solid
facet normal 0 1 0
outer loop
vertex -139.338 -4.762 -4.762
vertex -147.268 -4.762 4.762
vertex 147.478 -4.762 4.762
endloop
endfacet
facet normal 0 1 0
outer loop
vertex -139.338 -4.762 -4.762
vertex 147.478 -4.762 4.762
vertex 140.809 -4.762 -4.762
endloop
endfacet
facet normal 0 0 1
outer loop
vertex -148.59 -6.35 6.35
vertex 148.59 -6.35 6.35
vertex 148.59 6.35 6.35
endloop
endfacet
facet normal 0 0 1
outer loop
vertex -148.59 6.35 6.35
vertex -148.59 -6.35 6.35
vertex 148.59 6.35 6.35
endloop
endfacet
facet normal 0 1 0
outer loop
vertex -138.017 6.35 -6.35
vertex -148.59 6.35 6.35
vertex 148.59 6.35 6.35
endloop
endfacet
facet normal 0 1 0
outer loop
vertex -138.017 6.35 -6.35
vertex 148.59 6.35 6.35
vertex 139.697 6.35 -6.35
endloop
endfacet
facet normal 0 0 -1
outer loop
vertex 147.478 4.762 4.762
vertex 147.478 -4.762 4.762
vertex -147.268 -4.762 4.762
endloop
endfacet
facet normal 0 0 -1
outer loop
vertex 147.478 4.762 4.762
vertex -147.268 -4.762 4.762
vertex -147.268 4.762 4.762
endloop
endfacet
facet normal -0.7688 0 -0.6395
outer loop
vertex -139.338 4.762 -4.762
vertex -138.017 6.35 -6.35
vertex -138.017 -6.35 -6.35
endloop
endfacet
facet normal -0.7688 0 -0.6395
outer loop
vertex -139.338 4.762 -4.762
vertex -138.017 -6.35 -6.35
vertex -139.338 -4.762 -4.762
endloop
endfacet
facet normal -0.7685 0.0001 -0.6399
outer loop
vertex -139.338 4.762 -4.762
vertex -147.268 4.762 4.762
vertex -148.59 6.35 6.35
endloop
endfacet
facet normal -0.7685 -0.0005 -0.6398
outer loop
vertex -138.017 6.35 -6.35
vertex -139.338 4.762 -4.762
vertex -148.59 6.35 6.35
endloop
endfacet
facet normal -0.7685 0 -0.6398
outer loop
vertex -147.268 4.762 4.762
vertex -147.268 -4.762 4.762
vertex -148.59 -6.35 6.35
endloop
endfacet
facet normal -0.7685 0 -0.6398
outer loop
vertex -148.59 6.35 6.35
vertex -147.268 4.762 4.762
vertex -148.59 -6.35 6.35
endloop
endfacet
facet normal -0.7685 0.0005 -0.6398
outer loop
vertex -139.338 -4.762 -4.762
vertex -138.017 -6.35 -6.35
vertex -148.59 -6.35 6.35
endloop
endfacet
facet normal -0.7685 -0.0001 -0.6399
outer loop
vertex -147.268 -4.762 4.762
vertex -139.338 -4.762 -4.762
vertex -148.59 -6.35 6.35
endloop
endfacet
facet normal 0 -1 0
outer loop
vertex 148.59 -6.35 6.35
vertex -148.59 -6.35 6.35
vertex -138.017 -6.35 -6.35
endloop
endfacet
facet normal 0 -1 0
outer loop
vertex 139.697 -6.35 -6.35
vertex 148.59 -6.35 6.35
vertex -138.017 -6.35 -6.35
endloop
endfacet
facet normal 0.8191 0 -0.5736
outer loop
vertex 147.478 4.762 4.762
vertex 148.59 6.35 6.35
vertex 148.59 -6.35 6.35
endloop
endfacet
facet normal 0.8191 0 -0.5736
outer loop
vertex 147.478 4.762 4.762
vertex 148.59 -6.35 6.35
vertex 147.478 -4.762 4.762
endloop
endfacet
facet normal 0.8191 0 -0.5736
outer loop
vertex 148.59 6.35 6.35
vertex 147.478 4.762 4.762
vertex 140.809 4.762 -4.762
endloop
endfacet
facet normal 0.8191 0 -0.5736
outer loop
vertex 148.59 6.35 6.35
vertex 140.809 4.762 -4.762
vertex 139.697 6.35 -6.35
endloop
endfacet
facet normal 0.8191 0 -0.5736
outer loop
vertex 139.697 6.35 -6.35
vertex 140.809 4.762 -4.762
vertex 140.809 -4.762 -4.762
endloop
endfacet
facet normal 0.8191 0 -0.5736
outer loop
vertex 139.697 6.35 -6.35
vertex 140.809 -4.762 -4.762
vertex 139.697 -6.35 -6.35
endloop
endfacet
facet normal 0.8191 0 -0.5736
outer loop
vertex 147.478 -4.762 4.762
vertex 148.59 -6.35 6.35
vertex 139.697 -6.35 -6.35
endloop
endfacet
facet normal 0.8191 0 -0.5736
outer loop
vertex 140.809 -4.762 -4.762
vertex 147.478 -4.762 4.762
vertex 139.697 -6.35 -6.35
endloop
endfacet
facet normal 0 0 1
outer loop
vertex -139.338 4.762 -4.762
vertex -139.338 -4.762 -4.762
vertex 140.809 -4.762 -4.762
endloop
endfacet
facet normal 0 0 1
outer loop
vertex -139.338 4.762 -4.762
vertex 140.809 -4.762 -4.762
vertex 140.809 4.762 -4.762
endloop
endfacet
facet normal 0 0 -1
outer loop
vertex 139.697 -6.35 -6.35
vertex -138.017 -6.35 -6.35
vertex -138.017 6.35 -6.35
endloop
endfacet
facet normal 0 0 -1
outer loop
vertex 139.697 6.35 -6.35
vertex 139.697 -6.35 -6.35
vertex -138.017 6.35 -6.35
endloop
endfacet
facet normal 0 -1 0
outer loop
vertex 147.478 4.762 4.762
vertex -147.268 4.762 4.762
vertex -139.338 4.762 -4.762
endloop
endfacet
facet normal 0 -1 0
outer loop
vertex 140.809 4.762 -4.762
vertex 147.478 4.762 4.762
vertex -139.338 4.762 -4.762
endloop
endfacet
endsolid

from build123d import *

# Parameters (mm, degrees)
SKETCH1_W               = 12.7
SKETCH1_H               = 12.7
SKETCH1_W_2             = 9.525
SKETCH1_H_2             = 9.525
BOSS_EXTRUDE1_DEPTH     = 148.59
CUT_EXTRUDE1_DEPTH      = 149.861120176
CUT_EXTRUDE1_DEPTH_BACK = 149.861120176
CUT_EXTRUDE2_DEPTH      = 149.861120176
CUT_EXTRUDE2_DEPTH_BACK = 149.861120176


with BuildPart() as part:
    # Sketch1 → Boss-Extrude1 (new, symmetric)
    with BuildSketch(Plane(origin=(0, 0, 0), x_dir=(0, 0, -1), z_dir=(1, 0, 0))):
        Rectangle(SKETCH1_W, SKETCH1_H)
        Rectangle(SKETCH1_W_2, SKETCH1_H_2, mode=Mode.SUBTRACT)
    extrude(amount=BOSS_EXTRUDE1_DEPTH, both=True)

    # Sketch2 → Cut-Extrude1 (cut, two sides: drawn at the far end of the back side and taken through both)
    with BuildSketch(Plane(origin=(0, 0, 0), x_dir=(1, 0, 0), z_dir=(0, 1, 0)).offset(-CUT_EXTRUDE1_DEPTH_BACK)):
        Polygon((148.59, -6.35), (125.346319759, 26.845415605), (148.59, 26.845415605), align=None)
    extrude(amount=CUT_EXTRUDE1_DEPTH + CUT_EXTRUDE1_DEPTH_BACK, mode=Mode.SUBTRACT)

    # Sketch3 → Cut-Extrude2 (cut, two sides: drawn at the far end of the back side and taken through both)
    with BuildSketch(Plane(origin=(0, 0, 0), x_dir=(1, 0, 0), z_dir=(0, 1, 0)).offset(-CUT_EXTRUDE2_DEPTH_BACK)):
        Polygon((-138.016734859, 6.35), (-148.59, -6.35), (-148.59, 6.35), align=None)
    extrude(amount=CUT_EXTRUDE2_DEPTH + CUT_EXTRUDE2_DEPTH_BACK, mode=Mode.SUBTRACT)


solid = part.part
